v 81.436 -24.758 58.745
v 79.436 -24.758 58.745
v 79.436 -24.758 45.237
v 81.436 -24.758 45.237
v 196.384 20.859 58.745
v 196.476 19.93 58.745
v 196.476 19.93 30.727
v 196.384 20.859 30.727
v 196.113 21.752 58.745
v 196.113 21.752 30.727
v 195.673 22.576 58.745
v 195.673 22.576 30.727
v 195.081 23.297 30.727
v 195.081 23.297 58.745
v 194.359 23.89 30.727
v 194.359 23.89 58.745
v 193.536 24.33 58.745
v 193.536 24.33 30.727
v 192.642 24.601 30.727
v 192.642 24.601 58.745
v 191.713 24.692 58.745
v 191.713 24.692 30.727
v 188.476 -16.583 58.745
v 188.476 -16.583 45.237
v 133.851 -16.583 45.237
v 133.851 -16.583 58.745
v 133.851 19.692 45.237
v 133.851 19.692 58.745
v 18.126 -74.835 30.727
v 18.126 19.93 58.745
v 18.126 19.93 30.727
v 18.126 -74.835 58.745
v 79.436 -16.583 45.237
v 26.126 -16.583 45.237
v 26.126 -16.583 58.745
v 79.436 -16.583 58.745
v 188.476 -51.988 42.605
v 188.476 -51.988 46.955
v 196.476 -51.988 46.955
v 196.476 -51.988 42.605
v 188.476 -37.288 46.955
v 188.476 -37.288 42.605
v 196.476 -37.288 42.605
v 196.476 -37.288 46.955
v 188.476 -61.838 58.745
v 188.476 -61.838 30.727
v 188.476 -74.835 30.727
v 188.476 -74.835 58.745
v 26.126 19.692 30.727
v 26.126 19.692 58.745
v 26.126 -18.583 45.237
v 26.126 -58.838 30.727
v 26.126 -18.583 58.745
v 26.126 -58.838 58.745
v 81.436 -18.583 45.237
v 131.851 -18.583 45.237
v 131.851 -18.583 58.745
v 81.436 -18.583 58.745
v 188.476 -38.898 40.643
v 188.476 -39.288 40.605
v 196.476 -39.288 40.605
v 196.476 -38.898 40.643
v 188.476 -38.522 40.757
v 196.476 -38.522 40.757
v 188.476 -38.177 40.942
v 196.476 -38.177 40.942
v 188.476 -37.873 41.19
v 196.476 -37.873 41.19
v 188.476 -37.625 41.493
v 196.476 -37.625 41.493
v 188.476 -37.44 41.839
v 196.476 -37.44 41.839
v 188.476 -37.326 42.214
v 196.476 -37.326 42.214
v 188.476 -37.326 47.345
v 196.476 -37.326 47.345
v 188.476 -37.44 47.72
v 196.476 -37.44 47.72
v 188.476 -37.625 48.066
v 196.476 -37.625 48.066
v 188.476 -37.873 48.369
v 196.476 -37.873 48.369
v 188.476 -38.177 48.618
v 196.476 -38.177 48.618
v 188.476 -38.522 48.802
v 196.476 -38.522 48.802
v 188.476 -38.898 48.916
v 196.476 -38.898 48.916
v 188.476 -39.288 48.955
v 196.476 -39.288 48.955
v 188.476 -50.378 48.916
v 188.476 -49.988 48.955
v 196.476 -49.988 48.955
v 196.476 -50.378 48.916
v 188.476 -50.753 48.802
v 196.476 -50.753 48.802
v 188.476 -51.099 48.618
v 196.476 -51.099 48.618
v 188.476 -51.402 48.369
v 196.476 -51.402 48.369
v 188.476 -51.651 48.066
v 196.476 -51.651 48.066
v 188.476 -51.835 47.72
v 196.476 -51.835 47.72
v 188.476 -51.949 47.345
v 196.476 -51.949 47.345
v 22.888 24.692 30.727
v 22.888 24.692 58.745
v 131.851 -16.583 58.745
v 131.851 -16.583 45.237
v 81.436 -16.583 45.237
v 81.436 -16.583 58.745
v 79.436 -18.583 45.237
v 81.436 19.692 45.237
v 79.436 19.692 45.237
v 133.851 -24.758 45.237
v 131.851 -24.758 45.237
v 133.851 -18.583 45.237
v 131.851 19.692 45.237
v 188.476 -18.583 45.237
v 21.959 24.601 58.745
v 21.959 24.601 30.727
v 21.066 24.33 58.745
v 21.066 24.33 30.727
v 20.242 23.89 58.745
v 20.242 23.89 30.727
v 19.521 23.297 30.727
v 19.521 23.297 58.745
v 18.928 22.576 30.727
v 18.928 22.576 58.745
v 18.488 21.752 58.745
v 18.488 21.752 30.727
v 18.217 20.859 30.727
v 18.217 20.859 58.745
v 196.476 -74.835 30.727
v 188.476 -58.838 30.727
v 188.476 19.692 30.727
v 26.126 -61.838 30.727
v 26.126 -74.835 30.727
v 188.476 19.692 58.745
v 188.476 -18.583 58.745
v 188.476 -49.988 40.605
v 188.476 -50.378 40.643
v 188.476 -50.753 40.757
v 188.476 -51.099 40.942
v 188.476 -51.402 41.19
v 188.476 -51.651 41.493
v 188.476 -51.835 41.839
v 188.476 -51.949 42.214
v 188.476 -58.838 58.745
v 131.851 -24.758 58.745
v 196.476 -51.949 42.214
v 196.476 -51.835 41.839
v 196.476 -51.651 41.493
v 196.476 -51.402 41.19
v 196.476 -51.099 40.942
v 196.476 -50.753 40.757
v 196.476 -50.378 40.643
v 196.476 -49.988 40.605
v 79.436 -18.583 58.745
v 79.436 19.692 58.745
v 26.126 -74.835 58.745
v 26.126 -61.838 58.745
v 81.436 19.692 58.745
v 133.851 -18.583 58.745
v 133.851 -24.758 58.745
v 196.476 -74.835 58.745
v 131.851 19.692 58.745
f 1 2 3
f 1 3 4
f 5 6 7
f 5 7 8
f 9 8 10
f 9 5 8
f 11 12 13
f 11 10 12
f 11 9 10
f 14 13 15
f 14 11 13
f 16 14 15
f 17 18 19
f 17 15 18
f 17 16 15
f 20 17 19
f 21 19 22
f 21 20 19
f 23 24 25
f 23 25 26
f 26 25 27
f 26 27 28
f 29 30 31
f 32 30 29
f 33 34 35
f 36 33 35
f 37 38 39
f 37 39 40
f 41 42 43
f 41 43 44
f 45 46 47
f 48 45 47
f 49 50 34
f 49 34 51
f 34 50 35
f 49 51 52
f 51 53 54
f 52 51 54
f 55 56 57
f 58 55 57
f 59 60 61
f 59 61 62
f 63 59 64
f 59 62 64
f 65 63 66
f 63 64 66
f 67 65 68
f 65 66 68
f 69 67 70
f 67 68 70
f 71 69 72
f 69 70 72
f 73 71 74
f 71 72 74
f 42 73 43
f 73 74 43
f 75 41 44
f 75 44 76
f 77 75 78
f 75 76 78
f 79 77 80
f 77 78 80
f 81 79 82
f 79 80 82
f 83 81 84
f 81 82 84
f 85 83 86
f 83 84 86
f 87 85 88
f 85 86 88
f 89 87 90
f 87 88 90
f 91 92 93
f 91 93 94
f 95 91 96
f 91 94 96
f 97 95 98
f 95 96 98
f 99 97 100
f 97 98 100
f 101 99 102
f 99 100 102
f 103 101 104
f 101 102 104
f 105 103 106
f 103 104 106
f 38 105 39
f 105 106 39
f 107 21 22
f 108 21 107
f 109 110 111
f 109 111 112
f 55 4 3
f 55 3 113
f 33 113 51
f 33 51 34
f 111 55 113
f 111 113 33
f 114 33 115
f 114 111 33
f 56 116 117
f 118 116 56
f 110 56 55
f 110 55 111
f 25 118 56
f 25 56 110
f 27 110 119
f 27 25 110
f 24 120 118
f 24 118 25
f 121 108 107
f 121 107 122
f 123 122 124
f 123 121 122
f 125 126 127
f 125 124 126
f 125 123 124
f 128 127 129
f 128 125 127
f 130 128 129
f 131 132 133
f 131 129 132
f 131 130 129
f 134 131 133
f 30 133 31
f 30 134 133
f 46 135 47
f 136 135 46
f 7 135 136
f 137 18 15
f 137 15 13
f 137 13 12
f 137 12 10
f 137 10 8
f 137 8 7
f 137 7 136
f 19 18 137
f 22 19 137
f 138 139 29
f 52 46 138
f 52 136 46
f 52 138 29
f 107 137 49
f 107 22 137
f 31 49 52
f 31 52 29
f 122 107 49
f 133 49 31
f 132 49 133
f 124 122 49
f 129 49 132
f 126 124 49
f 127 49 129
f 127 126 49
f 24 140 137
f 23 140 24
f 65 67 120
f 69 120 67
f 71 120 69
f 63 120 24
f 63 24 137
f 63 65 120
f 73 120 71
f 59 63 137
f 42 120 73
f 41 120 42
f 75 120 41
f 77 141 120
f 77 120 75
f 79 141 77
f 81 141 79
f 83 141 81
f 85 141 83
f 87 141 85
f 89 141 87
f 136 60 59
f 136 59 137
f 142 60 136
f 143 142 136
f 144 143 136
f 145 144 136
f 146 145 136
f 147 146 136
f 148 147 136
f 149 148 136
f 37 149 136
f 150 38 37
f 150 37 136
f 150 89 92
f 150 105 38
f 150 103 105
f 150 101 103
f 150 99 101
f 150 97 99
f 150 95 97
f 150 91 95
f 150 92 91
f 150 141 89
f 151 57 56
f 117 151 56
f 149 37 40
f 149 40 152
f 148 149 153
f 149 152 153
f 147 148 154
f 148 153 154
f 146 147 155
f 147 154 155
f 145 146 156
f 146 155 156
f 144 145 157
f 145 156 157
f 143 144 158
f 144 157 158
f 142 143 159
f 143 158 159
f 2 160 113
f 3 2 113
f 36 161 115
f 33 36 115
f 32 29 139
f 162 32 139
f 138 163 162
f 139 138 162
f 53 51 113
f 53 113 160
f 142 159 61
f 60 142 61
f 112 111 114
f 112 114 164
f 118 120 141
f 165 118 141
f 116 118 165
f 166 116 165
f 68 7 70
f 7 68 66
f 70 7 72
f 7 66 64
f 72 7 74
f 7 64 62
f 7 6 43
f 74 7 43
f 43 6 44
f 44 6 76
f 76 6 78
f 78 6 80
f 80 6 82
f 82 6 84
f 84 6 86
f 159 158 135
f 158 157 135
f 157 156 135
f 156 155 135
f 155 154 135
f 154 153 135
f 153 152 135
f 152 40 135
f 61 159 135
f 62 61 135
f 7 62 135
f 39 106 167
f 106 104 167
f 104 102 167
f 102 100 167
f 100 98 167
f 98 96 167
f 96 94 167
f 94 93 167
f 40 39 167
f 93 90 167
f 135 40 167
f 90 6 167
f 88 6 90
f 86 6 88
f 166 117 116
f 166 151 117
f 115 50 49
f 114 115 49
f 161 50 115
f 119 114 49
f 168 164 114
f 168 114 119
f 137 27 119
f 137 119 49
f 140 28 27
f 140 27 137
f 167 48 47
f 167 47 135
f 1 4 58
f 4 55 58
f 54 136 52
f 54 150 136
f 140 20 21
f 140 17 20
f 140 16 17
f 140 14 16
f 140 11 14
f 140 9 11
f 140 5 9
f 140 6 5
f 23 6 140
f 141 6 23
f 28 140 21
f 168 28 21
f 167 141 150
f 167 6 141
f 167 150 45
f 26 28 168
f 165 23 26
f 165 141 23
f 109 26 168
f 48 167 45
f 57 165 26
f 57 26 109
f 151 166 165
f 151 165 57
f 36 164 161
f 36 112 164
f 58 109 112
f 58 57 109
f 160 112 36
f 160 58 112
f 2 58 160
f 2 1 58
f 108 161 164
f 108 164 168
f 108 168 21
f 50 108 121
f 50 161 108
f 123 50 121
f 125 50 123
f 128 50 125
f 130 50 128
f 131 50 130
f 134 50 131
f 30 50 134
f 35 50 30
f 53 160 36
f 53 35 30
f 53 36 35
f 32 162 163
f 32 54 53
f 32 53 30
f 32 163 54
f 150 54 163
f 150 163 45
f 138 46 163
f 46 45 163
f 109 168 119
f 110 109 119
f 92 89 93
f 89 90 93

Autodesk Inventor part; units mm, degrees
ref_plane "YZ Plane" through (0, 0, 0) normal (1, 0, 0) x (0, 1, 0)
ref_plane "XZ Plane" through (0, 0, 0) normal (0, 1, 0) x (-1, 0, 0)
ref_plane "XY Plane" through (0, 0, 0) normal (0, 0, 1) x (1, 0, 0)
ref_plane "boardTop(tolerance)" through (29.1257, 19.6924, 40.7272) normal (0, -1, 0) x (1, 0, 0)
sketch "Sketch3" plane through (29.1257, 19.6924, 40.7272) normal (0, -1, 0) x (1, 0, 0)
  line L0 (-2, 1.51) -> (-2, 0)
  line L1 (158.35, 0) -> (158.35, 1.51)
  line L2 (-11, 18.0177) -> (-11, -5)
  line L3 (167.35, 18.0177) -> (167.35, -5)
  line L4 (167.35, 18.0177) -> (-11, 18.0177)
  line L5 (-11, -5) -> (167.35, -5)
  point P0 (-29.1257, -40.7272)
  point P1 (158.35, 0.755)
  dimension "d12" = 9
  dimension "d13" = 9
extrude "Extrusion3" add sketch "Sketch3" against normal blind 5
ref_plane "boardBottom(tolerance)" through (185.4757, -59.8376, 42.2372) normal (0, -1, 0) x (-1, 0, 0)
sketch "Sketch4" plane through (29.1257, 19.6924, 40.7272) normal (0, -1, 0) x (1, 0, 0)
  line L0 (-2, 1.51) -> (-2, 0)
  line L1 (158.35, 1.51) -> (158.35, 0)
  line L2 (-11, 18.0177) -> (-11, -5) projected
  line L3 (-11, -5) -> (167.35, -5) projected
  line L4 (167.35, -5) -> (167.35, 18.0177) projected
  line L5 (167.35, 18.0177) -> (-11, 18.0177) projected
  line L6 (159.35, -5) -> (159.35, 18.0177)
  line L7 (-11, 18.0177) -> (167.35, 18.0177) projected
  line L8 (-3, -5) -> (-3, 18.0177)
  point P0 (-29.1257, -40.7272)
  point P1 (158.35, 0.755)
  point P2 (-2, 0.755)
  point P3 (-3, 18.0177)
  dimension "d17" = 1
  dimension "d18" = 1
extrude "Extrusion4" add sketch "Sketch4" along normal blind 94.5274 contours L5 L8 L3 L2 | L5 L4 L3 L6
ref_plane "boardRight(tolerance)" through (188.4757, 19.6924, 35.7272) normal (-1, 0, 0) x (0, -1, 0)
sketch "Sketch5" plane through (188.4757, -74.835, 35.7272) normal (-1, 0, 0) x (0, 0, 1)
  line L0 (5, 15.9974) -> (6.51, 15.9974) projected
  line L1 (0, 94.5274) -> (23.0177, 94.5274) projected
  line L2 (0, 94.5274) -> (0, 0) projected
  line L3 (23.0177, 0) -> (0, 0) projected
  line L4 (23.0177, 94.5274) -> (23.0177, 0) projected
  line L5 (0, 94.5274) -> (0, 0) projected
  line L6 (0, 15.9974) -> (23.0177, 15.9974)
  line L7 (23.0177, 15.9974) -> (23.0177, 12.9974)
  line L8 (23.0177, 12.9974) -> (0, 12.9974)
  line L9 (0, 12.9974) -> (0, 15.9974)
  point P0 (-35.7272, 74.835)
  point P1 (0, 12.9974)
  point P2 (6.51, 15.9974)
  dimension "d21" = 3
ref_plane "boardLeft(tolerance)" through (26.1257, 19.6924, 58.7449) normal (1, 0, 0) x (0, -1, 0)
extrude "Extrusion5" add sketch "Sketch5" along normal up to surface (162.35 mm away) contours L0 L6 L4 L8 L2
sketch "Sketch6" plane through (29.1257, 19.6924, 40.7272) normal (0, -1, 0) x (1, 0, 0)
  line L0 (48.3131, 6.295) -> (48.54, 4.395) projected
  line L1 (54.3069, 2.495) -> (54.08, 4.395) projected
  line L2 (99.8531, 6.295) -> (100.08, 4.395) projected
  line L3 (107.5969, 2.495) -> (107.37, 4.395) projected
  line L4 (-3, 18.0177) -> (-3, -5) projected
  line L5 (-3, -5) -> (159.35, -5) projected
  line L6 (159.35, -5) -> (159.35, 18.0177) projected
  line L7 (159.35, 18.0177) -> (-3, 18.0177) projected
  line L8 (0, 1.51) -> (156.35, 1.51) projected
  line L9 (102.725, 1.51) -> (104.725, 1.51)
  line L10 (104.725, 1.51) -> (104.725, 18.0177)
  line L11 (104.725, 18.0177) -> (102.725, 18.0177)
  line L12 (102.725, 18.0177) -> (102.725, 1.51)
  line L13 (159.35, 18.0177) -> (-3, 18.0177) projected
  line L14 (50.31, 1.51) -> (52.31, 1.51)
  line L15 (52.31, 1.51) -> (52.31, 18.0177)
  line L16 (52.31, 18.0177) -> (50.31, 18.0177)
  line L17 (50.31, 18.0177) -> (50.31, 1.51)
  line L18 (48.4266, 5.345) -> (50.31, 5.345) construction
  line L19 (54.1934, 3.445) -> (52.31, 3.445) construction
  line L20 (99.9666, 5.345) -> (102.725, 5.345) construction
  line L21 (107.4834, 3.445) -> (104.725, 3.445) construction
  point P0 (-29.1257, -40.7272)
  point P1 (124.6421, 15.795)
  dimension "d31" = 2
  dimension "d32" = 2
extrude "Extrusion6" add sketch "Sketch6" along normal blind 44.45 contours L7 L15 L8 L17 | L7 L10 L8 L12
sketch "Sketch7" plane through (133.8507, 19.6924, 42.2372) normal (0, 0, -1) x (-1, 0, 0)
  line L0 (2, 0) -> (2, -44.45) projected
  line L1 (0, 0) -> (0, -44.45) projected
  line L2 (2, -44.45) -> (0, -44.45) projected
  line L3 (54.415, 0) -> (54.415, -44.45) projected
  line L4 (52.415, 0) -> (52.415, -44.45) projected
  line L5 (54.415, -44.45) -> (52.415, -44.45) projected
  line L6 (0, 0) -> (2, 0)
  line L7 (54.415, 0) -> (52.415, 0)
  point P0 (133.8507, -19.6924)
extrude "Extrusion7" cut sketch "Sketch7" against normal blind 3
sketch "Sketch9" plane through (188.4757, 19.6924, 35.7272) normal (-1, 0, 0) x (0, 0, 1)
  line L0 (9.51, -38.275) -> (23.0177, -38.275)
  line L1 (9.51, -36.275) -> (23.0177, -36.275)
  line L2 (9.51, -36.275) -> (23.0177, -36.275)
  line L3 (23.0177, -36.275) -> (23.0177, -38.275)
  line L4 (23.0177, -38.275) -> (9.51, -38.275)
  line L5 (9.51, -38.275) -> (9.51, -36.275)
  point P0 (-35.7272, -19.6924)
  dimension "d37" = 2
extrude "Extrusion8" add sketch "Sketch9" along normal up to surface (162.35 mm away)
fillet "Fillet1" radius 4.7625 2 edges at (18.1257, 24.6924, 47.236) (196.4757, 24.6924, 47.236)
sketch "Sketch10" plane through (196.4757, 19.6924, 35.7272) normal (-1, 0, 0) x (0, 0, 1)
  line L0 (10.3897, -67.2551) -> (10.3897, -61.4051) projected
  line L1 (7.715, -63.9401) -> (7.715, -66.58) projected
  line L2 (9.495, -60.3354) -> (8.9571, -60.3354) projected
  line L3 (8.9571, -68.3248) -> (9.495, -68.3248) projected
  arc A0 (10.145, -61.0301) -> (9.695, -60.5801) centre (9.695, -61.0301) ccw projected
  line L4 (8.4889, -60.7119) -> (7.8268, -61.374) projected
  line L5 (7.8268, -67.2862) -> (8.4889, -67.9483) projected
  line L6 (7.715, -62.0803) -> (7.715, -63.9301) projected
  line L7 (7.715, -63.9401) -> (7.715, -66.58) projected
  line L8 (10.3897, -67.2551) -> (10.3897, -61.4051) projected
  line L9 (11.2274, -71.6801) -> (6.8774, -71.6801)
  line L10 (4.8774, -69.6801) -> (4.8774, -58.9801)
  line L11 (6.8774, -56.9801) -> (11.2274, -56.9801)
  line L12 (13.2274, -58.9801) -> (13.2274, -69.6801)
  line L13 (9.226, -68.3248) -> (9.2261, -71.6801) construction
  line L14 (9.226, -60.3354) -> (9.226, -56.9801) construction
  line L15 (13.2274, -64.3301) -> (10.3897, -64.3301) construction
  line L16 (7.715, -64.3301) -> (4.8774, -64.3301) construction
  arc A1 (13.2274, -58.9801) -> (11.2274, -56.9801) centre (11.2274, -58.9801) ccw
  arc A2 (6.8774, -56.9801) -> (4.8774, -58.9801) centre (6.8774, -58.9801) ccw
  arc A3 (4.8774, -69.6801) -> (6.8774, -71.6801) centre (6.8774, -69.6801) ccw
  arc A4 (11.2274, -71.6801) -> (13.2274, -69.6801) centre (11.2274, -69.6801) ccw
  point P0 (-35.7272, -19.6924)
  point P1 (7.685, -61.1849)
  point P2 (13.2274, -71.6801)
  point P3 (4.8774, -56.9801)
  point P4 (4.8774, -71.6801)
  point P5 (13.2274, -56.9801)
  point P6 (9.495, -68.3248)
  dimension "d47" = 8.35
  dimension "d48" = 14.7
  dimension "d49" = 2
extrude "Extrusion9" cut sketch "Sketch10" along normal blind 8
sketch "Sketch11" plane through (196.4757, -74.835, 35.7272) normal (0, 0, -1) x (-1, 0, 0)
  arc A0 (4.7625, 99.5274) -> (0, 94.7649) centre (4.7625, 94.7649) ccw projected
  line L0 (0, 94.7649) -> (0, 0) projected
  line L1 (8, 0) -> (0, 0) projected
  line L2 (8, 12.9974) -> (8, 0) projected
  line L3 (8, 12.9974) -> (170.35, 12.9974) projected
  line L4 (170.35, 12.9974) -> (170.35, 0) projected
  line L5 (178.35, 0) -> (170.35, 0) projected
  line L6 (178.35, 94.7649) -> (178.35, 0) projected
  arc A1 (178.35, 94.7649) -> (173.5875, 99.5274) centre (173.5875, 94.7649) ccw projected
  line L7 (4.7625, 99.5274) -> (173.5875, 99.5274) projected
  line L8 (8, 15.9974) -> (170.35, 15.9974) projected
  line L9 (8, 94.5274) -> (8, 15.9974) projected
  line L10 (170.35, 94.5274) -> (8, 94.5274) projected
  line L11 (170.35, 94.5274) -> (170.35, 15.9974) projected
  point P0 (196.4757, 74.835)
extrude "Extrusion10" add sketch "Sketch11" along normal blind 5
properties part number "case"
